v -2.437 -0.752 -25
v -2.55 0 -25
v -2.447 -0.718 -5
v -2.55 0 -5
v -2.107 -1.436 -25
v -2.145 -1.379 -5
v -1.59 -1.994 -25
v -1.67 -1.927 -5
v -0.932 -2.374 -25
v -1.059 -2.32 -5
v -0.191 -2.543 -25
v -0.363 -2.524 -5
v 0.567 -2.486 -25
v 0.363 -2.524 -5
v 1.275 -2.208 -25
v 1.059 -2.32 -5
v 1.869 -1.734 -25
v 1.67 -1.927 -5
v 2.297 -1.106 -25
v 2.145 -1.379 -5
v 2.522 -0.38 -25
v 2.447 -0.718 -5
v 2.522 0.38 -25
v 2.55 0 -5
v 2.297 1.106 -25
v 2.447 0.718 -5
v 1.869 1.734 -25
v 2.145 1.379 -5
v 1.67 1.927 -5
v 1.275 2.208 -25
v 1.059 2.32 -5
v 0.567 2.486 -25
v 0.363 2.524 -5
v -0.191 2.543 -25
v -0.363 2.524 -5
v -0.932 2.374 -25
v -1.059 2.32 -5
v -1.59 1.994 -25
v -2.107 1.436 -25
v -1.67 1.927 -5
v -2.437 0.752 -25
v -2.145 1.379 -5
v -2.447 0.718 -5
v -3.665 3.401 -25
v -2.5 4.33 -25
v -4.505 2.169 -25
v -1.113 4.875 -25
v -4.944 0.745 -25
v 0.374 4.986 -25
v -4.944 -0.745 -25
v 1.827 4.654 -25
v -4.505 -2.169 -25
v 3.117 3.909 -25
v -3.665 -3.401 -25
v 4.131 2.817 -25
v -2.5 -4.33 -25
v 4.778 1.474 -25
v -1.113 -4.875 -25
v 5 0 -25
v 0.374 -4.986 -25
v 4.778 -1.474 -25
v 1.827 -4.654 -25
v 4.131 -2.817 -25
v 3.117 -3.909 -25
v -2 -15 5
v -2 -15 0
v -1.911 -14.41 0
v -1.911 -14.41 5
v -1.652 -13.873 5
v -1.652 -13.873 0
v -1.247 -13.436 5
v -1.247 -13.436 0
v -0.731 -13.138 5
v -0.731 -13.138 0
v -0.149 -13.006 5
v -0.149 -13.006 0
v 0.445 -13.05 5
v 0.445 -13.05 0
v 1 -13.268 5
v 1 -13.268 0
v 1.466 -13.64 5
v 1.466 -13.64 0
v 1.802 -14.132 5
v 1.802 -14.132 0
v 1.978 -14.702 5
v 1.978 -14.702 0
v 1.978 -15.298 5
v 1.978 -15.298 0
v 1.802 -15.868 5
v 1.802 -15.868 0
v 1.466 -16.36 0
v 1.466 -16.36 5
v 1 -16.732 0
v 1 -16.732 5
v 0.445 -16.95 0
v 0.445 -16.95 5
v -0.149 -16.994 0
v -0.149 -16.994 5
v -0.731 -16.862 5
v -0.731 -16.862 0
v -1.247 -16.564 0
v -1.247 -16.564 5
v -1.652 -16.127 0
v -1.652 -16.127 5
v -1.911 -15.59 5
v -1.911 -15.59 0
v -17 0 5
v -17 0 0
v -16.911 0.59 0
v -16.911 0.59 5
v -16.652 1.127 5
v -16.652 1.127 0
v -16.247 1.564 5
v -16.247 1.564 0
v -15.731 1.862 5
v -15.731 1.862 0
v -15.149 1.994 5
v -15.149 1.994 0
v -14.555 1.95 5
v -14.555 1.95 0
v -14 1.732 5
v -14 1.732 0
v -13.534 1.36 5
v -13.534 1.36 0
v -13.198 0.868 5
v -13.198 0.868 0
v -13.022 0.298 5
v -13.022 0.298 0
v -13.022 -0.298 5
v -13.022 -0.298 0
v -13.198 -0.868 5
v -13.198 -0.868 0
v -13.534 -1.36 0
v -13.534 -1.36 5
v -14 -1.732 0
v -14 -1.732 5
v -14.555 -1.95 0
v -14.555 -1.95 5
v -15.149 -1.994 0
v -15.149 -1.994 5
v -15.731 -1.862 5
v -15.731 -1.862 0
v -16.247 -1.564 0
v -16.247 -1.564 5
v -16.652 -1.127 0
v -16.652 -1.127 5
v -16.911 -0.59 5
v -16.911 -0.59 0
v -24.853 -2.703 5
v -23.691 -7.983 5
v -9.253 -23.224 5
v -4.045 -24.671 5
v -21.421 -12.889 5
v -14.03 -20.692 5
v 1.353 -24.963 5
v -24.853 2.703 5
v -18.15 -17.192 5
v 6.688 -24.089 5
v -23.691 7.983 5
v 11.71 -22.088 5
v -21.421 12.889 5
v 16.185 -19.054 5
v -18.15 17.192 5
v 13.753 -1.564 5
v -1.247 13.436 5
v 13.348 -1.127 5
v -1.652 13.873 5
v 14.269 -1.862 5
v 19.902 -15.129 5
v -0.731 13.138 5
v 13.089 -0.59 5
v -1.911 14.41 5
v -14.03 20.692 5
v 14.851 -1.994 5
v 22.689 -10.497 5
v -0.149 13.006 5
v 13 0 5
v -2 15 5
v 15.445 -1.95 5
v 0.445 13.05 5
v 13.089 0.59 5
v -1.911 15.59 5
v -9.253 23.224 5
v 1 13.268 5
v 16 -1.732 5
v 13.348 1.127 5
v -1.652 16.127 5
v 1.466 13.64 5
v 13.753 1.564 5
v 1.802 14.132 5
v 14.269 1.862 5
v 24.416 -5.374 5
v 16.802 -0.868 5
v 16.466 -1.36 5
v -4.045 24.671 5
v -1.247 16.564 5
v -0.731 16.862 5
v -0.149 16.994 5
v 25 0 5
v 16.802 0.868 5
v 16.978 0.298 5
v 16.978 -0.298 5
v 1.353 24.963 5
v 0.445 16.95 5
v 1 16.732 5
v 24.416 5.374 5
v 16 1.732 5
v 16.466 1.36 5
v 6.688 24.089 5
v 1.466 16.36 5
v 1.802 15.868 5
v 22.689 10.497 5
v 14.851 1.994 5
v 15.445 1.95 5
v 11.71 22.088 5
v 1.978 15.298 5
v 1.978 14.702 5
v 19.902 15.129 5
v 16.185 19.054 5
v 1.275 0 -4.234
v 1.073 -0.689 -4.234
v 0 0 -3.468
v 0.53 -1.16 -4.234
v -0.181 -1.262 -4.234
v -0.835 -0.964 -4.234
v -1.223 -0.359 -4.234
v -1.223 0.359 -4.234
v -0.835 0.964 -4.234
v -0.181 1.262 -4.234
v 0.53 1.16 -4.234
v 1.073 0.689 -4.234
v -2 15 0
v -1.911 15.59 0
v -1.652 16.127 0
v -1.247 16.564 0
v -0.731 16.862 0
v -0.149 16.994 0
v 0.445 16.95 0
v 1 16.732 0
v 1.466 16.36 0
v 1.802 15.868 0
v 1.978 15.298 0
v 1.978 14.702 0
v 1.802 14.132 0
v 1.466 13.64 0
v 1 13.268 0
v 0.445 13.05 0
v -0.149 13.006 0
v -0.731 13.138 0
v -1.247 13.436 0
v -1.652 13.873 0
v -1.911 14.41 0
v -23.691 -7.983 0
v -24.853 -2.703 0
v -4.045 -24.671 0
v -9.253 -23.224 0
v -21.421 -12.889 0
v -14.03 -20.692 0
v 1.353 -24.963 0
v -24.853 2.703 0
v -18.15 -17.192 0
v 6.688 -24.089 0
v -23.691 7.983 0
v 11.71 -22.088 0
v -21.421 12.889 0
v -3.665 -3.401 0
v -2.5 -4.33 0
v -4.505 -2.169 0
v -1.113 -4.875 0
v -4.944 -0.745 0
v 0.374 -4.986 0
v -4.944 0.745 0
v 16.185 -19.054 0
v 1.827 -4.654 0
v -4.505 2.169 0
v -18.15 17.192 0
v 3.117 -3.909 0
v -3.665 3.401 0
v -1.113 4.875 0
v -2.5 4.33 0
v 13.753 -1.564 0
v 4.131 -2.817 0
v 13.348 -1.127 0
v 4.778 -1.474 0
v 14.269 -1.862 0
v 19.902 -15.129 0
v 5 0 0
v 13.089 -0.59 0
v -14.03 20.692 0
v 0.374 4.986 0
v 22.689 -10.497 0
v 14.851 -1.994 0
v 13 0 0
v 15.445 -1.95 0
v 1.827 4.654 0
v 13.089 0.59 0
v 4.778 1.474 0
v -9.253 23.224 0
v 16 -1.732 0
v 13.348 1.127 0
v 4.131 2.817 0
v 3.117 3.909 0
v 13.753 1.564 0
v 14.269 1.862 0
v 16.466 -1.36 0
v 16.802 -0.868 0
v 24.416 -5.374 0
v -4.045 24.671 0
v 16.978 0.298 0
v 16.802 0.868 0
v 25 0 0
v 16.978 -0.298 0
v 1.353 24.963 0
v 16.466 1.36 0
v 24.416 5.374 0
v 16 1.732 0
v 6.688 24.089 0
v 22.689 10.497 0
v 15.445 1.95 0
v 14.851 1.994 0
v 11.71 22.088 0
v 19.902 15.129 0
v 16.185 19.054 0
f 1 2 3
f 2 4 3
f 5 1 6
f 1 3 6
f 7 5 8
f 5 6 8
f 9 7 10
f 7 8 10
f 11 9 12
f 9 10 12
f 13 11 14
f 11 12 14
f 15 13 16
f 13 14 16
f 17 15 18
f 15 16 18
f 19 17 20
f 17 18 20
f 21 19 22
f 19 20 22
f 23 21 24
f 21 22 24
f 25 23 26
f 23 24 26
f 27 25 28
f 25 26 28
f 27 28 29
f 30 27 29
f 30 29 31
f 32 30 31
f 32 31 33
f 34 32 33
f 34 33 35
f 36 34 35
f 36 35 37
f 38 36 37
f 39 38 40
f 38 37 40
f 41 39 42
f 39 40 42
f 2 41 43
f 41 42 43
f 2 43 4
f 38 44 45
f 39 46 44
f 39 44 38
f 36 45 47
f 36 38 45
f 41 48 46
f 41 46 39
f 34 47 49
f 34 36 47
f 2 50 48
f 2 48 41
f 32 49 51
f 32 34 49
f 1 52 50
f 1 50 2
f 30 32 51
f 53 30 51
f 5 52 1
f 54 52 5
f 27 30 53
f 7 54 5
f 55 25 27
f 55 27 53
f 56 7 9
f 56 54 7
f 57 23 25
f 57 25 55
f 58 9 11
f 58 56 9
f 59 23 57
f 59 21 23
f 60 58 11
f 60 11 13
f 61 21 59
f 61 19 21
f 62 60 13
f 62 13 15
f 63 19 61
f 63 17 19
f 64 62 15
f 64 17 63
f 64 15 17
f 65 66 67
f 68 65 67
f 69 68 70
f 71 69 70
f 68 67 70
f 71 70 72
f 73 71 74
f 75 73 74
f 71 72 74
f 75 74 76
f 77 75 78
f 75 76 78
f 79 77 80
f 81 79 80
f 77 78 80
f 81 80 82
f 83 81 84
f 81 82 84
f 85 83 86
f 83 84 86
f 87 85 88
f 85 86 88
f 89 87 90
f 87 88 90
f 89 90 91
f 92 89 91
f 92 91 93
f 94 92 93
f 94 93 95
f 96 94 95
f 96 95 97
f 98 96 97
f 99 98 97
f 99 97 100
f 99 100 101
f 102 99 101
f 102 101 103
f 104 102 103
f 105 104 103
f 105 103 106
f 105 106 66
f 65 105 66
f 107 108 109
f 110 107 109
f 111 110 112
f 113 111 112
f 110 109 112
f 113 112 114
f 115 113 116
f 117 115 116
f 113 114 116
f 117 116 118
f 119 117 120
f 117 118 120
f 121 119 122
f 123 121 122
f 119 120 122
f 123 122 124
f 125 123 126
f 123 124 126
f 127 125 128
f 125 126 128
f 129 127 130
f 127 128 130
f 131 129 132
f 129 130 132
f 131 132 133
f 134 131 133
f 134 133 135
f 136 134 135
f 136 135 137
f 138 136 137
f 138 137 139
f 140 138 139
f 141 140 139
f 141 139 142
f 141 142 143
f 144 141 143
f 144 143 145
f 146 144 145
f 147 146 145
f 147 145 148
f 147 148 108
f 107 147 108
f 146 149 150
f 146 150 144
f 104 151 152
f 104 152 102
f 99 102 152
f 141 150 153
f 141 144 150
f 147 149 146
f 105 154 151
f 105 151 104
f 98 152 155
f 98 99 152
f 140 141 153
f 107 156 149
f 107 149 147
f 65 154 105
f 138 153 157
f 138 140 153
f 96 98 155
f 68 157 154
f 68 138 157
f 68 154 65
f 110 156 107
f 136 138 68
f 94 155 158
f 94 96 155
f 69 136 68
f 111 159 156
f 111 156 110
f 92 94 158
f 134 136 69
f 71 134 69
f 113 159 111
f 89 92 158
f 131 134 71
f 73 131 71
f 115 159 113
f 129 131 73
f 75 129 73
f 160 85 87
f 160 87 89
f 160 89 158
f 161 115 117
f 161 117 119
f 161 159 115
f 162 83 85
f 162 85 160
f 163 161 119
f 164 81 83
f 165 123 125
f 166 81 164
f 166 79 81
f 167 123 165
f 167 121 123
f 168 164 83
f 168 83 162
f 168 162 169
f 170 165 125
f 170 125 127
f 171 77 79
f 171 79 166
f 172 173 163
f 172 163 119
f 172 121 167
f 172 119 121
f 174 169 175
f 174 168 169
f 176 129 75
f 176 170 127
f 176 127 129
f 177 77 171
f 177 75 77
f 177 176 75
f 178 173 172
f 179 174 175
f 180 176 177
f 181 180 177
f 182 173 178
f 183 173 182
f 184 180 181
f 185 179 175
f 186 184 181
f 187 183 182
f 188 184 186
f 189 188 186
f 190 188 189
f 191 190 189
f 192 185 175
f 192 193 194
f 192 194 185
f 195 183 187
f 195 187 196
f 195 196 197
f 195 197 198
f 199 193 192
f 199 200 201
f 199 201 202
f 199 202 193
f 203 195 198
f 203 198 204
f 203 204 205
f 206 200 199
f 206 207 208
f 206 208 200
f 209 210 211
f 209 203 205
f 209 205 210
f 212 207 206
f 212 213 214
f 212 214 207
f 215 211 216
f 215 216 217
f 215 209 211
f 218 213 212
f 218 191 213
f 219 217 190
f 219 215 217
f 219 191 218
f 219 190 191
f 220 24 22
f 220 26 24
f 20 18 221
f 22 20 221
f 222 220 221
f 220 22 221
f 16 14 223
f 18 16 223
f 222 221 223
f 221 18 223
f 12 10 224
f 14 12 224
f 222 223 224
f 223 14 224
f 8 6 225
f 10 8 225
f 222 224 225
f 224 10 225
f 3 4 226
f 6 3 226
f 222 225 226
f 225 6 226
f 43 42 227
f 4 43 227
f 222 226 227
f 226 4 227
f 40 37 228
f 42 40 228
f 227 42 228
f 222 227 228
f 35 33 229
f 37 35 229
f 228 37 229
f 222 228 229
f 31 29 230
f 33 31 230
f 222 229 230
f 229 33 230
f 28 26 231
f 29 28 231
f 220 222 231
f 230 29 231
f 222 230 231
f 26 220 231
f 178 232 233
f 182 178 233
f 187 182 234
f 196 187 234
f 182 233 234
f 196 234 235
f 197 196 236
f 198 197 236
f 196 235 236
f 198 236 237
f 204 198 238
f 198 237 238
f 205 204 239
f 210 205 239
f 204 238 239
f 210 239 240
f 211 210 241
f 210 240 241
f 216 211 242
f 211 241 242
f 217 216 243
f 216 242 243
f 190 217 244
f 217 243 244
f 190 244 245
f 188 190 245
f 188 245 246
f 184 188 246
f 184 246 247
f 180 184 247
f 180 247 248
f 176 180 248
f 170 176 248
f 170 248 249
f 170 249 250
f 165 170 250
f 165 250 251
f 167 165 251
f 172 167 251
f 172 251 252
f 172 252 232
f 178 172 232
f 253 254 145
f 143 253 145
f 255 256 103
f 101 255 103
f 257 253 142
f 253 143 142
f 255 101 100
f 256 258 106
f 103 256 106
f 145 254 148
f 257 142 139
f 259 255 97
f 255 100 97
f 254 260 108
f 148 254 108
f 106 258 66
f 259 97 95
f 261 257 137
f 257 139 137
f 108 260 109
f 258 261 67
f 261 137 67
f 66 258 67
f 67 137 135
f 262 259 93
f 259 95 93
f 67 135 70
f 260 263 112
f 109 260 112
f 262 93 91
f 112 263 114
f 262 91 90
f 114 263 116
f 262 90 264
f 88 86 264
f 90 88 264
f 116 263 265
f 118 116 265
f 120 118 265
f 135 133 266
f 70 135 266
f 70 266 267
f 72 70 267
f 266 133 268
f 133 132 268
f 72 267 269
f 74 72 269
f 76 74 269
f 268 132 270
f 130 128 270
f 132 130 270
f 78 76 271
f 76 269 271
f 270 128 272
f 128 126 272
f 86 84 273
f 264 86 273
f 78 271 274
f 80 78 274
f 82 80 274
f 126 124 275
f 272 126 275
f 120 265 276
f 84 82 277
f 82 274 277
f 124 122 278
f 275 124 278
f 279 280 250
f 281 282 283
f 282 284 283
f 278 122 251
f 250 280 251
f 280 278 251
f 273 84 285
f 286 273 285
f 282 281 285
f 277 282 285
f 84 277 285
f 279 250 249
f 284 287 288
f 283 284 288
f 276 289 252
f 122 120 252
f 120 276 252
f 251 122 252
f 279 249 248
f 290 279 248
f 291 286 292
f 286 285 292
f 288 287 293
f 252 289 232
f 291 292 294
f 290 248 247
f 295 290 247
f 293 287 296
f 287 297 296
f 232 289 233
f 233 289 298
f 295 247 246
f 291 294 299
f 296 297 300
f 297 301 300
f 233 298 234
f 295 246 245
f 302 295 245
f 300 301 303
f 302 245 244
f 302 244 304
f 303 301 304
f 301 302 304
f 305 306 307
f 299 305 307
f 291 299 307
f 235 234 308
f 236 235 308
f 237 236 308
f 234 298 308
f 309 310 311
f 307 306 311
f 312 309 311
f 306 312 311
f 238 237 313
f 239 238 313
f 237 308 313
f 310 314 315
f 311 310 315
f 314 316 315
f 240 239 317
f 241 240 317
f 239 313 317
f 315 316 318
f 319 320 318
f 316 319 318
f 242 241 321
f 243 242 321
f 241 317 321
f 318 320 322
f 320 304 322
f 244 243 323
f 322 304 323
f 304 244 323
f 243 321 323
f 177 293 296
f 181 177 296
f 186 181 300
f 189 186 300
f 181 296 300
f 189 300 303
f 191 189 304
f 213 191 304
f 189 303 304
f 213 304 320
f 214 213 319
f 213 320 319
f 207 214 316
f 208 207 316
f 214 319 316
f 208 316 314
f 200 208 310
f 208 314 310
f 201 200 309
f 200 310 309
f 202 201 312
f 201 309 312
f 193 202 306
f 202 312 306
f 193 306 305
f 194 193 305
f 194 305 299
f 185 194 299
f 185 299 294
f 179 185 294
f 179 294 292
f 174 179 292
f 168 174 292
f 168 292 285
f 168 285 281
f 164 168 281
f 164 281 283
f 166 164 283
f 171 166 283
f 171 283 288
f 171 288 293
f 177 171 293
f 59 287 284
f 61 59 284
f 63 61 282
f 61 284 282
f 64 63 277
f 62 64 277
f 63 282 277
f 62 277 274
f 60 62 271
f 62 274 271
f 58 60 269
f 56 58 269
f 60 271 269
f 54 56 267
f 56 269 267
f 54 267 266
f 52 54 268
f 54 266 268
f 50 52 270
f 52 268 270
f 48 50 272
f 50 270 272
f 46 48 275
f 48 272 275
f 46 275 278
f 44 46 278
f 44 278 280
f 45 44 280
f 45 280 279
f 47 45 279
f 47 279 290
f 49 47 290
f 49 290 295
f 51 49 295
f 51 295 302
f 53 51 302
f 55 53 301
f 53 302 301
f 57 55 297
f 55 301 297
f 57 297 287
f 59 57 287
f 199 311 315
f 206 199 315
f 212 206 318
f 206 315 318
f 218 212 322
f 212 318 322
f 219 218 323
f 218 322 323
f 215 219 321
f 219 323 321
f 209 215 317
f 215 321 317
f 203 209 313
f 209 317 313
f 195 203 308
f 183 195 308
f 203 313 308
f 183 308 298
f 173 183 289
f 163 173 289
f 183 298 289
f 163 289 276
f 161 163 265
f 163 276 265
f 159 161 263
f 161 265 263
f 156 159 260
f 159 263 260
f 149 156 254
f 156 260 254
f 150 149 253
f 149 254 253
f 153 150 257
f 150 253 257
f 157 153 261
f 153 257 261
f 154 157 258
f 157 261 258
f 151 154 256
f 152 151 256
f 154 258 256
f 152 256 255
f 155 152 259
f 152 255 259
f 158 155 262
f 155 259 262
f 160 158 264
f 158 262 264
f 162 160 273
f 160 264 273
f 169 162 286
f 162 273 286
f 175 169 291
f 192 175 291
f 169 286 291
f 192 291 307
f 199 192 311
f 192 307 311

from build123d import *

# Parameters (mm, degrees)
F0_R     = 25
F1_DEPTH = 5
F2_R     = 5
F3_DEPTH = 25
F5_D     = 5.1
F5_DEPTH = 20
F5_TIP   = 1.5321945785
F7_D     = 4
F7_DEPTH = 20
F7_TIP   = 1.2017212381


with BuildPart() as f1:
    # F0 (on Top) → F1 (new body)
    with BuildSketch(Plane.XY):
        Circle(F0_R)
    extrude(amount=F1_DEPTH)

    # F2 (on face) → F3 (join)
    with BuildSketch(Plane(origin=(0, 0, 0), x_dir=(1, 0, 0), z_dir=(0, 0, -1))):
        Circle(F2_R)
    extrude(amount=F3_DEPTH)

    # F5
    with Locations(Plane(origin=(0, 0, -25), x_dir=(1, 0, 0), z_dir=(0, 0, -1))):
        with Locations((0, 0)):
            Hole(F5_D / 2, depth=F5_DEPTH)
            with Locations((0, 0, -(F5_DEPTH + F5_TIP / 2))):  # 118° drill point
                Cone(0, F5_D / 2, F5_TIP, mode=Mode.SUBTRACT)

    # F7
    with Locations(Plane.XY.offset(5)):
        with Locations((0, 15), (-15, 0), (0, -15), (15, 0)):
            Hole(F7_D / 2, depth=F7_DEPTH)
            with Locations((0, 0, -(F7_DEPTH + F7_TIP / 2))):  # 118° drill point
                Cone(0, F7_D / 2, F7_TIP, mode=Mode.SUBTRACT)


solid = f1.part
